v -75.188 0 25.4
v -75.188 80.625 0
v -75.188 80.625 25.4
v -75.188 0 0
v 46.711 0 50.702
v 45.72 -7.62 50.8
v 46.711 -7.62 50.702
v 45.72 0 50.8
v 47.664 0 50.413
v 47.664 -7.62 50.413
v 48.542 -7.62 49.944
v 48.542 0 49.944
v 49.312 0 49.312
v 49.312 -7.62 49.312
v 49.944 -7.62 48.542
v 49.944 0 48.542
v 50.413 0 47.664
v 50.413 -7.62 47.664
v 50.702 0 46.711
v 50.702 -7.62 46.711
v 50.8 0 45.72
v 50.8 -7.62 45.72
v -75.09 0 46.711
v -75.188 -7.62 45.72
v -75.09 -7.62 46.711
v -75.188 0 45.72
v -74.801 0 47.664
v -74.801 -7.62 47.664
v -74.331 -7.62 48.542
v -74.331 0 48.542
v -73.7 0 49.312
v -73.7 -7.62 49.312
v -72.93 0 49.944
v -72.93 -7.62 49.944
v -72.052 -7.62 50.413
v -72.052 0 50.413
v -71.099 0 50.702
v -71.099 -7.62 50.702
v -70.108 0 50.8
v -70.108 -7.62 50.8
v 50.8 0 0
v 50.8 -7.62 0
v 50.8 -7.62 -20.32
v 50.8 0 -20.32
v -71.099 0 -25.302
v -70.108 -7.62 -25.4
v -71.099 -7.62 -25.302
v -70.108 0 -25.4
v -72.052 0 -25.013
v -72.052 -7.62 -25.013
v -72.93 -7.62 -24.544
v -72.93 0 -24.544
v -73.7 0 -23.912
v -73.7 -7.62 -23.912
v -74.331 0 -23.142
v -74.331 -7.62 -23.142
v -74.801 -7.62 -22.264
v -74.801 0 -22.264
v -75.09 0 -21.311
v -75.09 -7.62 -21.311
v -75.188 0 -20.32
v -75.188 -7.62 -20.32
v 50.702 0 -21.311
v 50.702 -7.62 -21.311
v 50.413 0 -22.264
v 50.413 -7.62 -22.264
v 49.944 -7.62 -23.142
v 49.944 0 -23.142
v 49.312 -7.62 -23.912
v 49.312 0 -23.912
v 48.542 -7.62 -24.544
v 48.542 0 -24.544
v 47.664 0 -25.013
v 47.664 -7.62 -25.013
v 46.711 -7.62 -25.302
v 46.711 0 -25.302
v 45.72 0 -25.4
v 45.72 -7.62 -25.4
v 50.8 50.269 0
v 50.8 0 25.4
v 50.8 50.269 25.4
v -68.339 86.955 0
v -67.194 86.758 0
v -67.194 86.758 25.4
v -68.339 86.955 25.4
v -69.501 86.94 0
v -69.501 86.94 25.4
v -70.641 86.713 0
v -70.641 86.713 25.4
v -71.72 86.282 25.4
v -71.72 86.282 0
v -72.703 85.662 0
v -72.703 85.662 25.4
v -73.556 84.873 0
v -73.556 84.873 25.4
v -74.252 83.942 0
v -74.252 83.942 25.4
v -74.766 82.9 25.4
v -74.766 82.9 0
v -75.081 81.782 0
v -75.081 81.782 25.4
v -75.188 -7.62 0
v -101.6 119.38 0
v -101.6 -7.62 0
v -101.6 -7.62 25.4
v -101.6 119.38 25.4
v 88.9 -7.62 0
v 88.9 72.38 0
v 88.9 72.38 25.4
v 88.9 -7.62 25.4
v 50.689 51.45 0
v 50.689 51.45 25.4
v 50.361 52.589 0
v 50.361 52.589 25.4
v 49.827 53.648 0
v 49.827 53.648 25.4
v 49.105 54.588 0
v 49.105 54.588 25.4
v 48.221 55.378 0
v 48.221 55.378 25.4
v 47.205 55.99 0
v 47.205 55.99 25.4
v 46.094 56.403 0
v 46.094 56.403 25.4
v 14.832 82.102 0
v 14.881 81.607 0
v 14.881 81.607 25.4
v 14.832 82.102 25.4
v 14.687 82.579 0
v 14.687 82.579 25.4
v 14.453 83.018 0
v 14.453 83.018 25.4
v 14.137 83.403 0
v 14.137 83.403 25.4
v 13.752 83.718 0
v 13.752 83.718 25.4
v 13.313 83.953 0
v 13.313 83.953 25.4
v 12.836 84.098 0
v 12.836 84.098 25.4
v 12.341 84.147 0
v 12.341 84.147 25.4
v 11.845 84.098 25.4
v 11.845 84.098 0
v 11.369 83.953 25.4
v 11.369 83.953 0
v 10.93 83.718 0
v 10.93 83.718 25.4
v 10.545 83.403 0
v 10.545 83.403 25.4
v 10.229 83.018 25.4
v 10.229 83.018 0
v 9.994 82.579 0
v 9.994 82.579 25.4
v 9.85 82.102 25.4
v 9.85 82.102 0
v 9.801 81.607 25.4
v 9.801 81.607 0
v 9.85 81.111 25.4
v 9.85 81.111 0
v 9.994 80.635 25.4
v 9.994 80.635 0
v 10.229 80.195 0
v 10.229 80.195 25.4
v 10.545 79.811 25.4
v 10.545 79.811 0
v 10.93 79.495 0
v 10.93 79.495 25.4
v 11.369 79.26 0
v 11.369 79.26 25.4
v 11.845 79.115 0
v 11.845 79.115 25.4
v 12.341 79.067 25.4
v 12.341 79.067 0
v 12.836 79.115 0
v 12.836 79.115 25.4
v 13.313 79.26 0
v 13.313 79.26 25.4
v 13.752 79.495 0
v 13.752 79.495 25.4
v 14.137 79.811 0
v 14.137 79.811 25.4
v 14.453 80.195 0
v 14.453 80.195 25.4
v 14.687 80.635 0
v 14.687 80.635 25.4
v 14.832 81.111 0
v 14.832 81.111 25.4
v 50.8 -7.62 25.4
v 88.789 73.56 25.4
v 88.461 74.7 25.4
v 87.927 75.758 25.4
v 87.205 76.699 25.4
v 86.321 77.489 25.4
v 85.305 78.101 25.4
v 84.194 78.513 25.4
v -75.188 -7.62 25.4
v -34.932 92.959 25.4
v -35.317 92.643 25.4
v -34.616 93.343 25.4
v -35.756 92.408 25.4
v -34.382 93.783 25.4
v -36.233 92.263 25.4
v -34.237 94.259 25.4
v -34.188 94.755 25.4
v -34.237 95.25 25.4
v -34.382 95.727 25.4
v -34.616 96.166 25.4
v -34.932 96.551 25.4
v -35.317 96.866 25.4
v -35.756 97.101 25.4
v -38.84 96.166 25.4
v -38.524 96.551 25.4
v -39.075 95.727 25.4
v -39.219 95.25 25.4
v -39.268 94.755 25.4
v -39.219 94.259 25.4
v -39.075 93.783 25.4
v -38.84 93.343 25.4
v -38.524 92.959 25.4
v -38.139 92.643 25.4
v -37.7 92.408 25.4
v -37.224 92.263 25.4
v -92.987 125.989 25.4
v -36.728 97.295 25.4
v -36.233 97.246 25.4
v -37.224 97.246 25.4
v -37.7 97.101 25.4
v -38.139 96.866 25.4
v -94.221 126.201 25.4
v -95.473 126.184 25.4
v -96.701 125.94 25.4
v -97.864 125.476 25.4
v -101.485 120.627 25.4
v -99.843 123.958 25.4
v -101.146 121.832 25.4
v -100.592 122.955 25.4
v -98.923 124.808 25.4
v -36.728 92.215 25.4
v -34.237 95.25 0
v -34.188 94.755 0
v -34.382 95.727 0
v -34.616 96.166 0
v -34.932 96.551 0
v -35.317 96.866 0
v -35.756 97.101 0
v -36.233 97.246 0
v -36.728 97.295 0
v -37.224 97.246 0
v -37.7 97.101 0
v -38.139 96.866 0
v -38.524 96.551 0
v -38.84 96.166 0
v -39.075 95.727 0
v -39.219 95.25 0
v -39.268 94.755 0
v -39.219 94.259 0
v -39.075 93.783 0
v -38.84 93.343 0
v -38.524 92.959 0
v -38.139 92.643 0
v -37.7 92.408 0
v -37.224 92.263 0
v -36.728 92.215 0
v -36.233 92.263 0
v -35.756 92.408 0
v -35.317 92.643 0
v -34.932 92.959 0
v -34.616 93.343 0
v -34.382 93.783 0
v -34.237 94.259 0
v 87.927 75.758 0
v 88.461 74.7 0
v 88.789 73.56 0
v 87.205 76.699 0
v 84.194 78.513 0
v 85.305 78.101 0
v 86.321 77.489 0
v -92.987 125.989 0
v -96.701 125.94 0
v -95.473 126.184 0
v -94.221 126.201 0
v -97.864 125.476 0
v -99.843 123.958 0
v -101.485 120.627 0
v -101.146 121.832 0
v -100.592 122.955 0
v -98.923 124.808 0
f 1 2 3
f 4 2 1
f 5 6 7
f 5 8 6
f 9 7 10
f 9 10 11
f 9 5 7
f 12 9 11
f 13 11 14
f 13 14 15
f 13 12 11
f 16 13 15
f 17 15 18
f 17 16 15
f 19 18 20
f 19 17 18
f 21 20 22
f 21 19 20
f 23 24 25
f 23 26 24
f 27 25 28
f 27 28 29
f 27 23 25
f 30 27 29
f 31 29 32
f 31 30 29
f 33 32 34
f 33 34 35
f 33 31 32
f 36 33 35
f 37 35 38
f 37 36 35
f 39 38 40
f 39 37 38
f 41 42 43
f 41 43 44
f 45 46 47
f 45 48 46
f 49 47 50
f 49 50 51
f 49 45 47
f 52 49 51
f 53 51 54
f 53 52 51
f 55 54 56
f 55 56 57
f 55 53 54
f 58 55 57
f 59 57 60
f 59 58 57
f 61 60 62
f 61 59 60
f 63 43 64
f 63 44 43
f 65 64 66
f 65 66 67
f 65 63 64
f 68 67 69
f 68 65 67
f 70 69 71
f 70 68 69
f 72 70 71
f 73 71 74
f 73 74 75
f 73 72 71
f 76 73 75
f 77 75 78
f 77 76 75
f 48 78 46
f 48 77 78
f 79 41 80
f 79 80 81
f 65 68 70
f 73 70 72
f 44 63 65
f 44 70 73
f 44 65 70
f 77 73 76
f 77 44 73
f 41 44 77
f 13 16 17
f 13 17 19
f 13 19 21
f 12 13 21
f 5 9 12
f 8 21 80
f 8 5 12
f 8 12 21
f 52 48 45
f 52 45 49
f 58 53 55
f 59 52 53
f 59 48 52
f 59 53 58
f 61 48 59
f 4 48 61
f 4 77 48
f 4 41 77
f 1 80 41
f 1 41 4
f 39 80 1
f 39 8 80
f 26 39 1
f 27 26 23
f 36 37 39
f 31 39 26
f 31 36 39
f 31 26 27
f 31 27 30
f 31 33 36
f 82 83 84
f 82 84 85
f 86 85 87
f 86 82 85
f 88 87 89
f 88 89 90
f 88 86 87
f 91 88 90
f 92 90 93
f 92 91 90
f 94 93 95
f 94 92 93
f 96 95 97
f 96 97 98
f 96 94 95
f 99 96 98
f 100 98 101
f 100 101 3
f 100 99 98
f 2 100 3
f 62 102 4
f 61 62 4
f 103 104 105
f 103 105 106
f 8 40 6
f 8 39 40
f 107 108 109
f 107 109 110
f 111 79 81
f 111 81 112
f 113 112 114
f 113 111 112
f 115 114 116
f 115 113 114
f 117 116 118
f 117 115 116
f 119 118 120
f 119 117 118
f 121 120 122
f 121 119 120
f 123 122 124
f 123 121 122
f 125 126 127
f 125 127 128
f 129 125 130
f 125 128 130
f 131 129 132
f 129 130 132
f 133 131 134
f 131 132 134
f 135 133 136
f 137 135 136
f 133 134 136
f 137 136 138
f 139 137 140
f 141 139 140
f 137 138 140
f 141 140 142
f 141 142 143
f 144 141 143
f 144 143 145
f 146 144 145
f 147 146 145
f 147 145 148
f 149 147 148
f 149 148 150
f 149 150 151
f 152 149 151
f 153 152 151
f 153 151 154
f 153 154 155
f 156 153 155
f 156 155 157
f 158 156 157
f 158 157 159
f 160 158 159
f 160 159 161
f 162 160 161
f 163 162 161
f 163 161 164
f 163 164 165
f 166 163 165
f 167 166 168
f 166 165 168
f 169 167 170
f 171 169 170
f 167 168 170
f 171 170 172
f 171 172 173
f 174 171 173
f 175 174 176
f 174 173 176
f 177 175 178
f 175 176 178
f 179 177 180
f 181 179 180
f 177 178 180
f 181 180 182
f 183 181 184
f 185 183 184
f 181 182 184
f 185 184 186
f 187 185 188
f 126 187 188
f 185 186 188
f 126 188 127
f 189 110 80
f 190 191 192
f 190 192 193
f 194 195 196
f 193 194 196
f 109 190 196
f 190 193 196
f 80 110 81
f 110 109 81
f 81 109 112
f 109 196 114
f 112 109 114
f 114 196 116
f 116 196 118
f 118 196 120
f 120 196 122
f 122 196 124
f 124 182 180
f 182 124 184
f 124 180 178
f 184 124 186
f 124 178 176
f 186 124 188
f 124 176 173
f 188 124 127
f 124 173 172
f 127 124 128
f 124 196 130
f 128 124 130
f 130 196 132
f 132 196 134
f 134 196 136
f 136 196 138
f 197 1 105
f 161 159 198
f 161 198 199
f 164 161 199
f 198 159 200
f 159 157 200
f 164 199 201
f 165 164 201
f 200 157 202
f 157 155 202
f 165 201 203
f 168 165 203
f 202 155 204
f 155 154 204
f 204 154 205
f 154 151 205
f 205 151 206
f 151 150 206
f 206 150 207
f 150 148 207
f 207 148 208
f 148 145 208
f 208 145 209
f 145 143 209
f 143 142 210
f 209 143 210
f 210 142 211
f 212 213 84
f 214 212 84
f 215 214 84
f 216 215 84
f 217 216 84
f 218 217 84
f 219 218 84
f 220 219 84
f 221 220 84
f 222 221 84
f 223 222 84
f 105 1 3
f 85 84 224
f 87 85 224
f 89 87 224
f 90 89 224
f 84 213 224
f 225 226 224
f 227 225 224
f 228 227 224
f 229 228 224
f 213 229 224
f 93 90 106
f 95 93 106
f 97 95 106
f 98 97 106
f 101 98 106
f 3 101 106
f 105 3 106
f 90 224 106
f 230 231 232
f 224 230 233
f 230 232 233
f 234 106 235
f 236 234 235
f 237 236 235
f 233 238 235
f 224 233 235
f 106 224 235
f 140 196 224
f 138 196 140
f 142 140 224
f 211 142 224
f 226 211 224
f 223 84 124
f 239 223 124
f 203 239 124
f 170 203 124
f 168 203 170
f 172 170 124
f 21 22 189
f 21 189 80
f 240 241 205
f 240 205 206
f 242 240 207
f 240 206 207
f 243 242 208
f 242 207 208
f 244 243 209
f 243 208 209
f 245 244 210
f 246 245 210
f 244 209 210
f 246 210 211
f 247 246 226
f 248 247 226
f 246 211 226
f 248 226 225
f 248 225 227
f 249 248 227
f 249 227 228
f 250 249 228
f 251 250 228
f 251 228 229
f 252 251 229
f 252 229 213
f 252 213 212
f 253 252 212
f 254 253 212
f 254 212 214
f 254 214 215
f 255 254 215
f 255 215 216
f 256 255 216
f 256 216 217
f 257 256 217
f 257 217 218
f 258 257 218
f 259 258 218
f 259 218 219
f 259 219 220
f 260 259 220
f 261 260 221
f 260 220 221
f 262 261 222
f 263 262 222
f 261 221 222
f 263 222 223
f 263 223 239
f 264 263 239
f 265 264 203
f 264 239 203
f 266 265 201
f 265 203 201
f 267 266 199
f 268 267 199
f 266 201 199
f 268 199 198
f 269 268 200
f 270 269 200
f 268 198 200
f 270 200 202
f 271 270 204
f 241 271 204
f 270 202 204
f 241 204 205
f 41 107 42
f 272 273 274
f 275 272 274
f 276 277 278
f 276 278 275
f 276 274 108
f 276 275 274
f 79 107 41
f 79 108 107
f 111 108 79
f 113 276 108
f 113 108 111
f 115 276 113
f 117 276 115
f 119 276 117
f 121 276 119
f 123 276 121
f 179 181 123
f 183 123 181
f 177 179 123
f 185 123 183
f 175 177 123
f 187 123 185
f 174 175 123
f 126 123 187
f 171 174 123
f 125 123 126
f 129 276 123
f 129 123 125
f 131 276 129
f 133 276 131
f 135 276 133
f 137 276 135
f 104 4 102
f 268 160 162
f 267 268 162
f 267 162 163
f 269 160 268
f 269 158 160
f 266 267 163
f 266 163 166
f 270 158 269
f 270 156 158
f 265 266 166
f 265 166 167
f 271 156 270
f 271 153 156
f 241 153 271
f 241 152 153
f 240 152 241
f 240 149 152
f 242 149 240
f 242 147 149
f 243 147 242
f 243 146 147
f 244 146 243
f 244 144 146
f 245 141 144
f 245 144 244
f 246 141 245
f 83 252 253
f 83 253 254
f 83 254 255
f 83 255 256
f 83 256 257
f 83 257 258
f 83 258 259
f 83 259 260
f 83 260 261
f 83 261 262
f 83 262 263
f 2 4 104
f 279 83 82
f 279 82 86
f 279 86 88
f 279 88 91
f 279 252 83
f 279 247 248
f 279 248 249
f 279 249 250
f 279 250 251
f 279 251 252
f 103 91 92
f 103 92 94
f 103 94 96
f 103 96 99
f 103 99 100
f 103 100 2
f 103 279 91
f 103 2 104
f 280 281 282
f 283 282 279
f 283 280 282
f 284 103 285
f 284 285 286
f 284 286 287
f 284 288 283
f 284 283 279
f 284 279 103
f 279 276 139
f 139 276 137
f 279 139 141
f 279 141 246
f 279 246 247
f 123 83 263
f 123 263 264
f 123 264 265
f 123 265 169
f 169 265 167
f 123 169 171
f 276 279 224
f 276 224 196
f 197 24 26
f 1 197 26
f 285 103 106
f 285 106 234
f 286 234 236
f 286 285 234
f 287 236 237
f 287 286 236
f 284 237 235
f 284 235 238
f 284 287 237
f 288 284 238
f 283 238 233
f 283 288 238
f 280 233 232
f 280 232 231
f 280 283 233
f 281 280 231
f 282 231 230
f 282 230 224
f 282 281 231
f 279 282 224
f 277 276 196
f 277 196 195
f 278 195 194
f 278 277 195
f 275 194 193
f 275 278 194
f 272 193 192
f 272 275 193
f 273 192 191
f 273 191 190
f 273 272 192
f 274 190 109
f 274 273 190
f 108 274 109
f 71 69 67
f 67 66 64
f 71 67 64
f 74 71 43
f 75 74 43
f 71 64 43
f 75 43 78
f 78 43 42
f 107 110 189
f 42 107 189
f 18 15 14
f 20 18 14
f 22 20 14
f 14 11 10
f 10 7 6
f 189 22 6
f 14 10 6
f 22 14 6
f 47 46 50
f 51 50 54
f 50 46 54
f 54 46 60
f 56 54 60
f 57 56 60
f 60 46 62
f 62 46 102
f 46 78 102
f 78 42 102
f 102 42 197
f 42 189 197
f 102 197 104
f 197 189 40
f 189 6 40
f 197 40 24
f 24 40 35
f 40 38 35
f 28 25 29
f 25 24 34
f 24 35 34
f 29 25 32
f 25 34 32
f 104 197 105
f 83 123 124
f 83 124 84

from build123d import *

# Parameters (mm, degrees)
BOSS_EXTRUDE1_DEPTH = 25.4
SKETCH2_W           = 125.987512686
SKETCH2_H           = 7.62
BOSS_EXTRUDE2_DEPTH = 25.4
FILLET1_R           = 5.08
SKETCH3_W           = 125.987512686
SKETCH3_H           = 7.62
BOSS_EXTRUDE3_DEPTH = 25.4
FILLET2_R           = 5.08
SKETCH4_R           = 2.54
CUT_EXTRUDE1_DEPTH  = 170.8092282


with BuildPart() as part:
    # Sketch1 → Boss-Extrude1 (new body)
    with BuildSketch(Plane.XY):
        with BuildLine():
            Line((-101.6, -7.62), (-101.6, 119.38))
            ThreePointArc((-101.6, 119.38), (-98.923175612, 124.808062894), (-92.987256343, 125.988790648))
            Line((-92.987256343, 125.988790648), (84.193500936, 78.513349821))
            ThreePointArc((84.193500936, 78.513349821), (87.587793711, 76.245355898), (88.9, 72.379720824))
            Line((88.9, 72.379720824), (88.9, -7.62))
            Line((88.9, -7.62), (0, -7.62))
            Line((0, -7.62), (-101.6, -7.62))
        make_face()
        with BuildLine():
            Line((0, 0), (50.8, 0))
            Line((50.8, 0), (50.8, 50.269221346))
            ThreePointArc((50.8, 50.269221346), (49.487793711, 54.13485642), (46.093500936, 56.402850343))
            Line((46.093500936, 56.402850343), (-67.194011749, 86.758147879))
            ThreePointArc((-67.194011749, 86.758147879), (-72.70314776, 85.662312593), (-75.187512686, 80.624518882))
            Line((-75.187512686, 80.624518882), (-75.187512686, 0))
            Line((-75.187512686, 0), (0, 0))
        make_face(mode=Mode.SUBTRACT)
    extrude(amount=BOSS_EXTRUDE1_DEPTH)

    # Sketch2 → Boss-Extrude2 (add)
    with BuildSketch(Plane.XY.offset(25.4)):
        with Locations((-12.193756343, -3.81)):
            Rectangle(SKETCH2_W, SKETCH2_H)
    extrude(amount=BOSS_EXTRUDE2_DEPTH)

    # Fillet1
    fillet1_edges = [part.edges().sort_by_distance(p)[0] for p in [
        (-75.187512686, -3.81, 50.8),
        (50.8, -3.81, 50.8),
    ]]
    fillet(fillet1_edges, radius=FILLET1_R)

    # Sketch3 → Boss-Extrude3 (add)
    with BuildSketch(Plane(origin=(0, 0, 0), x_dir=(-1, 0, 0), z_dir=(0, 0, -1))):
        with Locations((12.193756343, -3.81)):
            Rectangle(SKETCH3_W, SKETCH3_H)
    extrude(amount=BOSS_EXTRUDE3_DEPTH)

    # Fillet2
    fillet2_edges = [part.edges().sort_by_distance(p)[0] for p in [
        (-75.187512686, -3.81, -25.4),
        (50.8, -3.81, -25.4),
    ]]
    fillet(fillet2_edges, radius=FILLET2_R)

    # Sketch4 → Cut-Extrude1 (cut, through all)
    with BuildSketch(Plane.XY.offset(25.4)):
        with Locations((-36.728272331, 94.75455946)):
            Circle(SKETCH4_R)
        with Locations((12.340759645, 81.606551969)):
            Circle(SKETCH4_R)
    extrude(amount=-CUT_EXTRUDE1_DEPTH, mode=Mode.SUBTRACT)


solid = part.part
